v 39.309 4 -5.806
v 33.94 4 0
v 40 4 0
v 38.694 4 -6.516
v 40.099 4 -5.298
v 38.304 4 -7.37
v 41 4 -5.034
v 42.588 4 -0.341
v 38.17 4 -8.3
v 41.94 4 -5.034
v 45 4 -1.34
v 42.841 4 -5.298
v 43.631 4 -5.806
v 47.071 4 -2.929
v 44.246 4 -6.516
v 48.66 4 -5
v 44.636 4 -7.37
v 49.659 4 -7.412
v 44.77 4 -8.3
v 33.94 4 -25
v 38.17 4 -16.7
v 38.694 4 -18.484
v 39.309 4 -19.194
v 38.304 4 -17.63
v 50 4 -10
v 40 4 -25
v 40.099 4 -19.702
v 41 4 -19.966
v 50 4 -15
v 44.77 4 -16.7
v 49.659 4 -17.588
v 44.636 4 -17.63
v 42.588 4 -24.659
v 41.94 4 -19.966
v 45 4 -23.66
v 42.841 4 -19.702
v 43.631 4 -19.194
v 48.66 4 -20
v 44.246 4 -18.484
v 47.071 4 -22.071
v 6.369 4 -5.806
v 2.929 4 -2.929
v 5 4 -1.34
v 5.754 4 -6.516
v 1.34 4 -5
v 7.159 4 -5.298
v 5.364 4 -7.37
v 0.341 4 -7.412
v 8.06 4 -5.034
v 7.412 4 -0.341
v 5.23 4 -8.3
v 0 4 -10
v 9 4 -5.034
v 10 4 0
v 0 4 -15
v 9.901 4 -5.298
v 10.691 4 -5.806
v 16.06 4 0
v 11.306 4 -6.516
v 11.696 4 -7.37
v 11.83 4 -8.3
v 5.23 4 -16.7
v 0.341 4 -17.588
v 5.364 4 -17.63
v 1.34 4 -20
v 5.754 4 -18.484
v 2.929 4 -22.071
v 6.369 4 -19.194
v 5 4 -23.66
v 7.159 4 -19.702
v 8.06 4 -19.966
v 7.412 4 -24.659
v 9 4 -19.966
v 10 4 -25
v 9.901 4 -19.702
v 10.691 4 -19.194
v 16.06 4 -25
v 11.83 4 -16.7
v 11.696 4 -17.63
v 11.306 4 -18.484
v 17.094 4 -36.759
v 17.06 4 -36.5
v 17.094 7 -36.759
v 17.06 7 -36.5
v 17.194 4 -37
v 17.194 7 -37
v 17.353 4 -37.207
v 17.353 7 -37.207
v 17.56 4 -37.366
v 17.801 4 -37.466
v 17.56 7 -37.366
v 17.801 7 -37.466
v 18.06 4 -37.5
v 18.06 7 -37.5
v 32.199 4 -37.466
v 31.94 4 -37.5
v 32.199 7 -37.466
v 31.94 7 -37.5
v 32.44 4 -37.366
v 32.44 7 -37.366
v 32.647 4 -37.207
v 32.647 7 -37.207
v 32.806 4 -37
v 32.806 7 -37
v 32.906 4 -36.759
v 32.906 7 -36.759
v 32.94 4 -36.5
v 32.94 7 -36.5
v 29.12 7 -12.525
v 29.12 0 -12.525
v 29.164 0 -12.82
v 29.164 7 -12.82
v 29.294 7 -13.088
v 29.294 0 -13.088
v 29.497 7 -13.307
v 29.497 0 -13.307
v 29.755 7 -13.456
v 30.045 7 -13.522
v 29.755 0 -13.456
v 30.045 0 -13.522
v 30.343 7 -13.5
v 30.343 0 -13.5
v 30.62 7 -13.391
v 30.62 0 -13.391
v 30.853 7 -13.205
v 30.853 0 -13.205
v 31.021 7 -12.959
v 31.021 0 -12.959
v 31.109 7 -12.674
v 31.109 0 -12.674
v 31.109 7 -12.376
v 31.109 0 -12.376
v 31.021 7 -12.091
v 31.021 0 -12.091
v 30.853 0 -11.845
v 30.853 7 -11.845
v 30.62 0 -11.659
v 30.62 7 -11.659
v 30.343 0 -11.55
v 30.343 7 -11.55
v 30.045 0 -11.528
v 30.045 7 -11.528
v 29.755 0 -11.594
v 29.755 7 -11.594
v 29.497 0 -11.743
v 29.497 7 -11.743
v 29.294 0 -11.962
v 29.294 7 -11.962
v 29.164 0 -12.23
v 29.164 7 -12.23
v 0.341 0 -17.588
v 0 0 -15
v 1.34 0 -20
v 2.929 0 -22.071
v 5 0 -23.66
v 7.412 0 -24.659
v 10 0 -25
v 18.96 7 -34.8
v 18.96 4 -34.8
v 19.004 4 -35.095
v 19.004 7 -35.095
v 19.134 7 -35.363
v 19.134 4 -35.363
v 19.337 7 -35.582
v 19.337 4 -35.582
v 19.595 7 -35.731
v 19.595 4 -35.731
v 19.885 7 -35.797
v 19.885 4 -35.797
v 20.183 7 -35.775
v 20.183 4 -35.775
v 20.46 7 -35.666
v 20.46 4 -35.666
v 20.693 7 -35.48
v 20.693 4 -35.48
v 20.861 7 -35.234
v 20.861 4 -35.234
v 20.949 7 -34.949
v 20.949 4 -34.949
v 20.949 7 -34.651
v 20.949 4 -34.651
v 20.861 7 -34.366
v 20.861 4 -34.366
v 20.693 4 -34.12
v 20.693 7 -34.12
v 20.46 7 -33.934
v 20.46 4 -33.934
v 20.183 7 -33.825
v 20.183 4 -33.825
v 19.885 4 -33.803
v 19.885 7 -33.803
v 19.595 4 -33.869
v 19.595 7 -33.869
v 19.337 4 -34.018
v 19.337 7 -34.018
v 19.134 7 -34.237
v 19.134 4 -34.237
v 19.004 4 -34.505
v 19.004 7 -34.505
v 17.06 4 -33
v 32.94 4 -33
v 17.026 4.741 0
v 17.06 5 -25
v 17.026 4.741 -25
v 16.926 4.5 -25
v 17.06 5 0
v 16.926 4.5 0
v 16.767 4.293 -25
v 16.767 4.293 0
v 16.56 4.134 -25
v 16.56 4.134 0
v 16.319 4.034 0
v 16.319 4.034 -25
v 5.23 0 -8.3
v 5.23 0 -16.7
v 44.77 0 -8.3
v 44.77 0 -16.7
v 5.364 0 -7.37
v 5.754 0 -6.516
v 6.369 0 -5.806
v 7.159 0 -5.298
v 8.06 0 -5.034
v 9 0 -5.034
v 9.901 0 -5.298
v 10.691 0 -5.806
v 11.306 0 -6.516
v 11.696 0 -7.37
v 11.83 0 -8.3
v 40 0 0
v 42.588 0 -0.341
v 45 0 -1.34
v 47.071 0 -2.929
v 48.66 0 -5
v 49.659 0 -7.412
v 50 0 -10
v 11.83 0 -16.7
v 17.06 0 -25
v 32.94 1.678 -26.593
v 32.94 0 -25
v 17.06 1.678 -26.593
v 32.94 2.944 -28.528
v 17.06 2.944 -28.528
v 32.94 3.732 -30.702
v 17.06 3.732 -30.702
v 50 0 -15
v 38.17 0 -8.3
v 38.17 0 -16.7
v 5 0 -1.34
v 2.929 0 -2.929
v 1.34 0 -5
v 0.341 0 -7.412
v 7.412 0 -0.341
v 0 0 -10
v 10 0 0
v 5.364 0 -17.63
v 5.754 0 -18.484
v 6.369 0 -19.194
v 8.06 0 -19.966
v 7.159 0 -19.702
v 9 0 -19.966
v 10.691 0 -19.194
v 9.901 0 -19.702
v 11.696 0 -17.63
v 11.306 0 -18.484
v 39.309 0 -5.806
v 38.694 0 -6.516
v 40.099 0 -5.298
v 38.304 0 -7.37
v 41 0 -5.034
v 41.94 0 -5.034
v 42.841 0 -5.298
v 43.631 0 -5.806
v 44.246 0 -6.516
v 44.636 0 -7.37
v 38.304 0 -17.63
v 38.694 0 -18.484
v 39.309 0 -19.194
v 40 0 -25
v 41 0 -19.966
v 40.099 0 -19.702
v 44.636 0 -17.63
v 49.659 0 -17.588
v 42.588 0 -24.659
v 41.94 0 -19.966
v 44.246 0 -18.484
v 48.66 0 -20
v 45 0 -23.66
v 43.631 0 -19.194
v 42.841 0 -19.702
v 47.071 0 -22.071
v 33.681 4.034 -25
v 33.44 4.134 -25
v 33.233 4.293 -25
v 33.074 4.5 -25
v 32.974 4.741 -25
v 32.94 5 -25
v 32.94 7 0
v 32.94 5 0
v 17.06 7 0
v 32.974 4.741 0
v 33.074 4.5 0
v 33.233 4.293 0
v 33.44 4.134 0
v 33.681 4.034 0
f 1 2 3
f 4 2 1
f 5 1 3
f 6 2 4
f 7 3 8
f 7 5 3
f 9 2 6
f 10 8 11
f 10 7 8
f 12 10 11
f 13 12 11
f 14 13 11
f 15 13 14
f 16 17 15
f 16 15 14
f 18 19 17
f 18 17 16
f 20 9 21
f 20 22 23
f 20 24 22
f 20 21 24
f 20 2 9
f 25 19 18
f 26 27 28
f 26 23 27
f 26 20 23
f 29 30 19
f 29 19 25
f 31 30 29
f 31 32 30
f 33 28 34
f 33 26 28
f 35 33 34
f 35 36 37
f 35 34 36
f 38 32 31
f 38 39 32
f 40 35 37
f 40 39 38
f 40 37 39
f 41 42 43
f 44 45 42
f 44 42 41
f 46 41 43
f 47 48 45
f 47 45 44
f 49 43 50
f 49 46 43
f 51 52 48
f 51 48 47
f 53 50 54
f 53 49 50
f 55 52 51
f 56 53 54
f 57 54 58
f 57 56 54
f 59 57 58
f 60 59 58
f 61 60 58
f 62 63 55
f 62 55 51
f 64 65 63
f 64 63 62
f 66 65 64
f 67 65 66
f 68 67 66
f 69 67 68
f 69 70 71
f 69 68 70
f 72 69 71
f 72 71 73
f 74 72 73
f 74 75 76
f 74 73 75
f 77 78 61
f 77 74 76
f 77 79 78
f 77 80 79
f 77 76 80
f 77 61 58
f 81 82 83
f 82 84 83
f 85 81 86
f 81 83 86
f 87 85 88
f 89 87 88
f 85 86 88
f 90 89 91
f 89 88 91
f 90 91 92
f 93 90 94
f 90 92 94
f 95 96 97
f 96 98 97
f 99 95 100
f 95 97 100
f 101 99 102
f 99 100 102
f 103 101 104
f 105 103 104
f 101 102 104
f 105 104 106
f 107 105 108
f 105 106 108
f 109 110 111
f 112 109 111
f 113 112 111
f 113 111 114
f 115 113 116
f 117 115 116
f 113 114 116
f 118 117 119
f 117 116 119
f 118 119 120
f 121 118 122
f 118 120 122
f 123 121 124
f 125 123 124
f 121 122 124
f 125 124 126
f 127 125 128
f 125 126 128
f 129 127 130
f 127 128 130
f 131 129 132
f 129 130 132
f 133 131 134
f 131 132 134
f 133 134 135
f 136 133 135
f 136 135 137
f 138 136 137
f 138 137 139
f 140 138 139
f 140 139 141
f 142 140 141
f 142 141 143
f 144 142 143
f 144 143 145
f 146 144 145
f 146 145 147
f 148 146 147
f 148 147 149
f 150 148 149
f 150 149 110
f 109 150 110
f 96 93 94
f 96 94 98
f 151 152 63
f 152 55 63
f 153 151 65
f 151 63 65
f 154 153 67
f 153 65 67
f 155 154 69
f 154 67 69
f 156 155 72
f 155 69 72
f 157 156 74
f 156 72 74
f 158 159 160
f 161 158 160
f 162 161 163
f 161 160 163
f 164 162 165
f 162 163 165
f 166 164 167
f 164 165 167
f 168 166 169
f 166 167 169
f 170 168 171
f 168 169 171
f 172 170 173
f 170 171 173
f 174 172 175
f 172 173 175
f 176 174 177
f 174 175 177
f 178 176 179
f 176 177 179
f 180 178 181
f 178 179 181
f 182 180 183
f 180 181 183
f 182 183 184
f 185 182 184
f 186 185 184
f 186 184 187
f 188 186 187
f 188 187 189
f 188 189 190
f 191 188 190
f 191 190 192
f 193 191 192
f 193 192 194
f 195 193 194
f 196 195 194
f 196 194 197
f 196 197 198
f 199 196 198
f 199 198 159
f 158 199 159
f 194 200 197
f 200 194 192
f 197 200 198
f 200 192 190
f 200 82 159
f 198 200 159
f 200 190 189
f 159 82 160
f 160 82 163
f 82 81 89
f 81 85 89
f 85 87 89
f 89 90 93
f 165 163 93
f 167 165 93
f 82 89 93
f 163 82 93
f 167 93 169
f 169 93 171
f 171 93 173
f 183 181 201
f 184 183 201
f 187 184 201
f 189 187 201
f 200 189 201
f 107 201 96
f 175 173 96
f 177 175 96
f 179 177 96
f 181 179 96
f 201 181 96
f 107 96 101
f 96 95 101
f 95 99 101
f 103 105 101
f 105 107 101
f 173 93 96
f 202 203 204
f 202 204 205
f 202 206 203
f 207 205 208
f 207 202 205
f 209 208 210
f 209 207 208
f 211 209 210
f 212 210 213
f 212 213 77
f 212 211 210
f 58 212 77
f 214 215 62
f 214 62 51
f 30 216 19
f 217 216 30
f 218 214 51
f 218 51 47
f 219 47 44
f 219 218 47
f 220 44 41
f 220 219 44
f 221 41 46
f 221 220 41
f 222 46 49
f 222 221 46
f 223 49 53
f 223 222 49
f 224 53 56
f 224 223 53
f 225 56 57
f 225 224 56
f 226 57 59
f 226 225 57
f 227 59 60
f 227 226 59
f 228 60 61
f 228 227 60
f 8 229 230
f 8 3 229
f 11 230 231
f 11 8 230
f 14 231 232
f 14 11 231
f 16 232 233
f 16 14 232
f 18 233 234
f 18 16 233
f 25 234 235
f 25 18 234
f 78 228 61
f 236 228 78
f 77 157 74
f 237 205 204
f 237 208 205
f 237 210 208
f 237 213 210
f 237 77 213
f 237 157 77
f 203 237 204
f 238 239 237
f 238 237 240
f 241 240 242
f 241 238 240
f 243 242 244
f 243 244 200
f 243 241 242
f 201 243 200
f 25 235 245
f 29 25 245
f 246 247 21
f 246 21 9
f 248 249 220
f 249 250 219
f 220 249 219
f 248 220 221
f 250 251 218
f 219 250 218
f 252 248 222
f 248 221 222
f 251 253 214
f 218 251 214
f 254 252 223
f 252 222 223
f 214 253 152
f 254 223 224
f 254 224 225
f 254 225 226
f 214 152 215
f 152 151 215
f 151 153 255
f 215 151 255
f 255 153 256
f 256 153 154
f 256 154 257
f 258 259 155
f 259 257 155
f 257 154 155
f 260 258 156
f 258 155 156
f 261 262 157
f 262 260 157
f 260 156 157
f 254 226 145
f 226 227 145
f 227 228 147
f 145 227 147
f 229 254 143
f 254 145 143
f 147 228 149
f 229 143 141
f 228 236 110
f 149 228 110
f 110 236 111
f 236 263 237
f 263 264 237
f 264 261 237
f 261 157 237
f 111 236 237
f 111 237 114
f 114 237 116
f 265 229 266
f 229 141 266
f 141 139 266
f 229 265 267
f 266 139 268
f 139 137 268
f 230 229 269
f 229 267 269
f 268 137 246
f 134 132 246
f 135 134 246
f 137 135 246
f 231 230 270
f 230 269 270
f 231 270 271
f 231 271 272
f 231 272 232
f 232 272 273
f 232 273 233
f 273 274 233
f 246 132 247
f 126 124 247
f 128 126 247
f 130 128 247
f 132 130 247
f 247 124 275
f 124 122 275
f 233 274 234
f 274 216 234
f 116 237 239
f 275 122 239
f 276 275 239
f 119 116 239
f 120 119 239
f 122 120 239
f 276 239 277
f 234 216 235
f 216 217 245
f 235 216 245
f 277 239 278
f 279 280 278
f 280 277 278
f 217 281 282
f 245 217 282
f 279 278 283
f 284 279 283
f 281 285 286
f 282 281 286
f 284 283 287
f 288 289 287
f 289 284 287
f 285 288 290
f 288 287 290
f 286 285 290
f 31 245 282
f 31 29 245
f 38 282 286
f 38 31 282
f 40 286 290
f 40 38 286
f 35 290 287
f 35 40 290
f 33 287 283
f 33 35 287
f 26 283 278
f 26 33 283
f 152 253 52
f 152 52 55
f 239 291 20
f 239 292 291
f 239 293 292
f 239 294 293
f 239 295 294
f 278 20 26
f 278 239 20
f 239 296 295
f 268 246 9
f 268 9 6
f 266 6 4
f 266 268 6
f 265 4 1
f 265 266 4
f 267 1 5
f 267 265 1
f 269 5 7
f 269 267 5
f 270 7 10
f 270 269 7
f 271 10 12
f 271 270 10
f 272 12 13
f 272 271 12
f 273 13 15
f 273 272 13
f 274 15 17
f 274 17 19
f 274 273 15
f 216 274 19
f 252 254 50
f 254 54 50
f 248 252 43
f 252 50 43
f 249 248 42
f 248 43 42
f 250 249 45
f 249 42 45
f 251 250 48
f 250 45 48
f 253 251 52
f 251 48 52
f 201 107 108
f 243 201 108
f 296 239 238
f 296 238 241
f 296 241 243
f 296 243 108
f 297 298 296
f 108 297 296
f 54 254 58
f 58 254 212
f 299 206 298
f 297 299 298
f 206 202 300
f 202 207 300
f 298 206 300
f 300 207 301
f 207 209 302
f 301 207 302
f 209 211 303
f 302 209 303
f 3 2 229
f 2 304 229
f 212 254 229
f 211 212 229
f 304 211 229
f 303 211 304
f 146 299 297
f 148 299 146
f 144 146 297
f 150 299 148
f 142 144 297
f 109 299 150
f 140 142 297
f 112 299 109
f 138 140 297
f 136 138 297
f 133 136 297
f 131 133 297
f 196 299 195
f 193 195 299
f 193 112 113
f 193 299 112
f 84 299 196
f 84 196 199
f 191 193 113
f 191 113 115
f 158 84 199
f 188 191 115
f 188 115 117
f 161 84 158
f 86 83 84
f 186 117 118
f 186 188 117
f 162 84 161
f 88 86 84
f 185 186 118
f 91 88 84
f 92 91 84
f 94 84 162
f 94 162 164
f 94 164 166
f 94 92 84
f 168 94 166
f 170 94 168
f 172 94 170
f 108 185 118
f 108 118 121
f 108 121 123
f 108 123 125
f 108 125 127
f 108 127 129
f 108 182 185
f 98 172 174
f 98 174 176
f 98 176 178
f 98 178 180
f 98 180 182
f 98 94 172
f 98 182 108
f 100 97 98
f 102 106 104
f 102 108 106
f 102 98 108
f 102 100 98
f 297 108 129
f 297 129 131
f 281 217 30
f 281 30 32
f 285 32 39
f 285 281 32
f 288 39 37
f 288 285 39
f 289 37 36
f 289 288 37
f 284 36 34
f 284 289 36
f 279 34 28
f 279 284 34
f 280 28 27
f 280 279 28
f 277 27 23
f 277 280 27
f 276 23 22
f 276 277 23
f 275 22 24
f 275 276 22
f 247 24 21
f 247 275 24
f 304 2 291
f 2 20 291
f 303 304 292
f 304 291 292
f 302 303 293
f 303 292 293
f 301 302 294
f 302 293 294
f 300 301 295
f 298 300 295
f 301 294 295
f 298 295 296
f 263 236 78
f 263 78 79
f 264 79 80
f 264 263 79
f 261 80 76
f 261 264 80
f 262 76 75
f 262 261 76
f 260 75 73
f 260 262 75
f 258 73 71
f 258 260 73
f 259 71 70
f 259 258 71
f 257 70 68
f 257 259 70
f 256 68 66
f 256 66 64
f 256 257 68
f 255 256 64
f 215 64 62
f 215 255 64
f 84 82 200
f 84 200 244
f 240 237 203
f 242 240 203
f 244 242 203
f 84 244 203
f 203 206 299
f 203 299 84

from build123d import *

# Parameters (mm, degrees)
SKETCH1_W                = 50
SKETCH1_H                = 25
BOSS_EXTRUDE1_DEPTH      = 4
SKETCH2_W                = 15.88
SKETCH2_H                = 37.5
BOSS_EXTRUDE2_DEPTH      = 3
M6_CLEARANCE_SLOT1_DEPTH = 4
M3_CLEARANCE_HOLE1_D     = 2
FILLET3_R                = 10
FILLET4_R                = 10
FILLET5_R                = 1


# Read off the part's stored shape, not the designer's step: M6 Clearance Slot1
with BuildPart() as part:
    # Sketch1 → Boss-Extrude1 (new body)
    with BuildSketch(Plane(origin=(0, 0, 0), x_dir=(1, 0, 0), z_dir=(0, 1, 0))):
        with Locations((25, 12.5)):
            Rectangle(SKETCH1_W, SKETCH1_H)
    extrude(amount=BOSS_EXTRUDE1_DEPTH)

    # Sketch2 → Boss-Extrude2 (add)
    with BuildSketch(Plane(origin=(0, 4, 0), x_dir=(1, 0, 0), z_dir=(0, 1, 0))):
        with Locations((25, 18.75)):
            Rectangle(SKETCH2_W, SKETCH2_H)
    extrude(amount=BOSS_EXTRUDE2_DEPTH)

    # M6 Clearance Slot1 outline → M6 Clearance Slot1 (cut)
    with BuildSketch(Plane(origin=(0, 0, 0), x_dir=(1, 0, 0), z_dir=(0, 1, 0))):
        with BuildLine():
            Line((44.77, 8.3), (44.77, 16.7))
            ThreePointArc((44.77, 16.7), (41.47, 20), (38.17, 16.7))
            Line((38.17, 16.7), (38.17, 8.3))
            ThreePointArc((38.17, 8.3), (41.47, 5), (44.77, 8.3))
        make_face()
        with BuildLine():
            Line((11.83, 8.3), (11.83, 16.7))
            ThreePointArc((11.83, 16.7), (8.53, 20), (5.23, 16.7))
            Line((5.23, 16.7), (5.23, 8.3))
            ThreePointArc((5.23, 8.3), (8.53, 5), (11.83, 8.3))
        make_face()
    extrude(amount=M6_CLEARANCE_SLOT1_DEPTH, mode=Mode.SUBTRACT)

    # M3 Clearance Hole1 (through all)
    with Locations(Plane(origin=(0, 7, 0), x_dir=(1, 0, 0), z_dir=(0, 1, 0))):
        with Locations((19.96, 34.8), (30.12, 12.525)):
            Hole(M3_CLEARANCE_HOLE1_D / 2)

    # Fillet3
    fillet3_edges = [part.edges().sort_by_distance(p)[0] for p in [
        (0, 2, -25),
        (50, 2, -25),
        (50, 2, 0),
        (0, 2, 0),
    ]]
    fillet(fillet3_edges, radius=FILLET3_R)

    # Fillet4
    # the kernel refuses this fillet: 10 mm, written as the material it adds along each edge
    with BuildSketch(Plane(origin=(32.94, 4, -25), x_dir=(0, -1, 0), z_dir=(-1, 0, 0))) as fillet4_piece_1:
        with BuildLine():
            CenterArc((10, -8), FILLET4_R, 126.869897646, 53.130102354)
            Line((0, -8), (-0.2, -8))
            Line((-0.2, -8), (-0.2, 0))
            Line((-0.2, 0), (0, 0.2))
            ThreePointArc((0, 0.2), (2, 0.2), (3.88, 0.16))
            Line((3.88, 0.16), (4, 0))
        make_face()
    extrude(amount=15.88)

    # Fillet5
    fillet5_edges = [part.edges().sort_by_distance(p)[0] for p in [
        (32.94, 4, -12.5),
        (17.06, 4, -12.5),
        (32.94, 5.5, -37.5),
        (17.06, 5.5, -37.5),
    ]]
    fillet(fillet5_edges, radius=FILLET5_R)


solid = part.part
